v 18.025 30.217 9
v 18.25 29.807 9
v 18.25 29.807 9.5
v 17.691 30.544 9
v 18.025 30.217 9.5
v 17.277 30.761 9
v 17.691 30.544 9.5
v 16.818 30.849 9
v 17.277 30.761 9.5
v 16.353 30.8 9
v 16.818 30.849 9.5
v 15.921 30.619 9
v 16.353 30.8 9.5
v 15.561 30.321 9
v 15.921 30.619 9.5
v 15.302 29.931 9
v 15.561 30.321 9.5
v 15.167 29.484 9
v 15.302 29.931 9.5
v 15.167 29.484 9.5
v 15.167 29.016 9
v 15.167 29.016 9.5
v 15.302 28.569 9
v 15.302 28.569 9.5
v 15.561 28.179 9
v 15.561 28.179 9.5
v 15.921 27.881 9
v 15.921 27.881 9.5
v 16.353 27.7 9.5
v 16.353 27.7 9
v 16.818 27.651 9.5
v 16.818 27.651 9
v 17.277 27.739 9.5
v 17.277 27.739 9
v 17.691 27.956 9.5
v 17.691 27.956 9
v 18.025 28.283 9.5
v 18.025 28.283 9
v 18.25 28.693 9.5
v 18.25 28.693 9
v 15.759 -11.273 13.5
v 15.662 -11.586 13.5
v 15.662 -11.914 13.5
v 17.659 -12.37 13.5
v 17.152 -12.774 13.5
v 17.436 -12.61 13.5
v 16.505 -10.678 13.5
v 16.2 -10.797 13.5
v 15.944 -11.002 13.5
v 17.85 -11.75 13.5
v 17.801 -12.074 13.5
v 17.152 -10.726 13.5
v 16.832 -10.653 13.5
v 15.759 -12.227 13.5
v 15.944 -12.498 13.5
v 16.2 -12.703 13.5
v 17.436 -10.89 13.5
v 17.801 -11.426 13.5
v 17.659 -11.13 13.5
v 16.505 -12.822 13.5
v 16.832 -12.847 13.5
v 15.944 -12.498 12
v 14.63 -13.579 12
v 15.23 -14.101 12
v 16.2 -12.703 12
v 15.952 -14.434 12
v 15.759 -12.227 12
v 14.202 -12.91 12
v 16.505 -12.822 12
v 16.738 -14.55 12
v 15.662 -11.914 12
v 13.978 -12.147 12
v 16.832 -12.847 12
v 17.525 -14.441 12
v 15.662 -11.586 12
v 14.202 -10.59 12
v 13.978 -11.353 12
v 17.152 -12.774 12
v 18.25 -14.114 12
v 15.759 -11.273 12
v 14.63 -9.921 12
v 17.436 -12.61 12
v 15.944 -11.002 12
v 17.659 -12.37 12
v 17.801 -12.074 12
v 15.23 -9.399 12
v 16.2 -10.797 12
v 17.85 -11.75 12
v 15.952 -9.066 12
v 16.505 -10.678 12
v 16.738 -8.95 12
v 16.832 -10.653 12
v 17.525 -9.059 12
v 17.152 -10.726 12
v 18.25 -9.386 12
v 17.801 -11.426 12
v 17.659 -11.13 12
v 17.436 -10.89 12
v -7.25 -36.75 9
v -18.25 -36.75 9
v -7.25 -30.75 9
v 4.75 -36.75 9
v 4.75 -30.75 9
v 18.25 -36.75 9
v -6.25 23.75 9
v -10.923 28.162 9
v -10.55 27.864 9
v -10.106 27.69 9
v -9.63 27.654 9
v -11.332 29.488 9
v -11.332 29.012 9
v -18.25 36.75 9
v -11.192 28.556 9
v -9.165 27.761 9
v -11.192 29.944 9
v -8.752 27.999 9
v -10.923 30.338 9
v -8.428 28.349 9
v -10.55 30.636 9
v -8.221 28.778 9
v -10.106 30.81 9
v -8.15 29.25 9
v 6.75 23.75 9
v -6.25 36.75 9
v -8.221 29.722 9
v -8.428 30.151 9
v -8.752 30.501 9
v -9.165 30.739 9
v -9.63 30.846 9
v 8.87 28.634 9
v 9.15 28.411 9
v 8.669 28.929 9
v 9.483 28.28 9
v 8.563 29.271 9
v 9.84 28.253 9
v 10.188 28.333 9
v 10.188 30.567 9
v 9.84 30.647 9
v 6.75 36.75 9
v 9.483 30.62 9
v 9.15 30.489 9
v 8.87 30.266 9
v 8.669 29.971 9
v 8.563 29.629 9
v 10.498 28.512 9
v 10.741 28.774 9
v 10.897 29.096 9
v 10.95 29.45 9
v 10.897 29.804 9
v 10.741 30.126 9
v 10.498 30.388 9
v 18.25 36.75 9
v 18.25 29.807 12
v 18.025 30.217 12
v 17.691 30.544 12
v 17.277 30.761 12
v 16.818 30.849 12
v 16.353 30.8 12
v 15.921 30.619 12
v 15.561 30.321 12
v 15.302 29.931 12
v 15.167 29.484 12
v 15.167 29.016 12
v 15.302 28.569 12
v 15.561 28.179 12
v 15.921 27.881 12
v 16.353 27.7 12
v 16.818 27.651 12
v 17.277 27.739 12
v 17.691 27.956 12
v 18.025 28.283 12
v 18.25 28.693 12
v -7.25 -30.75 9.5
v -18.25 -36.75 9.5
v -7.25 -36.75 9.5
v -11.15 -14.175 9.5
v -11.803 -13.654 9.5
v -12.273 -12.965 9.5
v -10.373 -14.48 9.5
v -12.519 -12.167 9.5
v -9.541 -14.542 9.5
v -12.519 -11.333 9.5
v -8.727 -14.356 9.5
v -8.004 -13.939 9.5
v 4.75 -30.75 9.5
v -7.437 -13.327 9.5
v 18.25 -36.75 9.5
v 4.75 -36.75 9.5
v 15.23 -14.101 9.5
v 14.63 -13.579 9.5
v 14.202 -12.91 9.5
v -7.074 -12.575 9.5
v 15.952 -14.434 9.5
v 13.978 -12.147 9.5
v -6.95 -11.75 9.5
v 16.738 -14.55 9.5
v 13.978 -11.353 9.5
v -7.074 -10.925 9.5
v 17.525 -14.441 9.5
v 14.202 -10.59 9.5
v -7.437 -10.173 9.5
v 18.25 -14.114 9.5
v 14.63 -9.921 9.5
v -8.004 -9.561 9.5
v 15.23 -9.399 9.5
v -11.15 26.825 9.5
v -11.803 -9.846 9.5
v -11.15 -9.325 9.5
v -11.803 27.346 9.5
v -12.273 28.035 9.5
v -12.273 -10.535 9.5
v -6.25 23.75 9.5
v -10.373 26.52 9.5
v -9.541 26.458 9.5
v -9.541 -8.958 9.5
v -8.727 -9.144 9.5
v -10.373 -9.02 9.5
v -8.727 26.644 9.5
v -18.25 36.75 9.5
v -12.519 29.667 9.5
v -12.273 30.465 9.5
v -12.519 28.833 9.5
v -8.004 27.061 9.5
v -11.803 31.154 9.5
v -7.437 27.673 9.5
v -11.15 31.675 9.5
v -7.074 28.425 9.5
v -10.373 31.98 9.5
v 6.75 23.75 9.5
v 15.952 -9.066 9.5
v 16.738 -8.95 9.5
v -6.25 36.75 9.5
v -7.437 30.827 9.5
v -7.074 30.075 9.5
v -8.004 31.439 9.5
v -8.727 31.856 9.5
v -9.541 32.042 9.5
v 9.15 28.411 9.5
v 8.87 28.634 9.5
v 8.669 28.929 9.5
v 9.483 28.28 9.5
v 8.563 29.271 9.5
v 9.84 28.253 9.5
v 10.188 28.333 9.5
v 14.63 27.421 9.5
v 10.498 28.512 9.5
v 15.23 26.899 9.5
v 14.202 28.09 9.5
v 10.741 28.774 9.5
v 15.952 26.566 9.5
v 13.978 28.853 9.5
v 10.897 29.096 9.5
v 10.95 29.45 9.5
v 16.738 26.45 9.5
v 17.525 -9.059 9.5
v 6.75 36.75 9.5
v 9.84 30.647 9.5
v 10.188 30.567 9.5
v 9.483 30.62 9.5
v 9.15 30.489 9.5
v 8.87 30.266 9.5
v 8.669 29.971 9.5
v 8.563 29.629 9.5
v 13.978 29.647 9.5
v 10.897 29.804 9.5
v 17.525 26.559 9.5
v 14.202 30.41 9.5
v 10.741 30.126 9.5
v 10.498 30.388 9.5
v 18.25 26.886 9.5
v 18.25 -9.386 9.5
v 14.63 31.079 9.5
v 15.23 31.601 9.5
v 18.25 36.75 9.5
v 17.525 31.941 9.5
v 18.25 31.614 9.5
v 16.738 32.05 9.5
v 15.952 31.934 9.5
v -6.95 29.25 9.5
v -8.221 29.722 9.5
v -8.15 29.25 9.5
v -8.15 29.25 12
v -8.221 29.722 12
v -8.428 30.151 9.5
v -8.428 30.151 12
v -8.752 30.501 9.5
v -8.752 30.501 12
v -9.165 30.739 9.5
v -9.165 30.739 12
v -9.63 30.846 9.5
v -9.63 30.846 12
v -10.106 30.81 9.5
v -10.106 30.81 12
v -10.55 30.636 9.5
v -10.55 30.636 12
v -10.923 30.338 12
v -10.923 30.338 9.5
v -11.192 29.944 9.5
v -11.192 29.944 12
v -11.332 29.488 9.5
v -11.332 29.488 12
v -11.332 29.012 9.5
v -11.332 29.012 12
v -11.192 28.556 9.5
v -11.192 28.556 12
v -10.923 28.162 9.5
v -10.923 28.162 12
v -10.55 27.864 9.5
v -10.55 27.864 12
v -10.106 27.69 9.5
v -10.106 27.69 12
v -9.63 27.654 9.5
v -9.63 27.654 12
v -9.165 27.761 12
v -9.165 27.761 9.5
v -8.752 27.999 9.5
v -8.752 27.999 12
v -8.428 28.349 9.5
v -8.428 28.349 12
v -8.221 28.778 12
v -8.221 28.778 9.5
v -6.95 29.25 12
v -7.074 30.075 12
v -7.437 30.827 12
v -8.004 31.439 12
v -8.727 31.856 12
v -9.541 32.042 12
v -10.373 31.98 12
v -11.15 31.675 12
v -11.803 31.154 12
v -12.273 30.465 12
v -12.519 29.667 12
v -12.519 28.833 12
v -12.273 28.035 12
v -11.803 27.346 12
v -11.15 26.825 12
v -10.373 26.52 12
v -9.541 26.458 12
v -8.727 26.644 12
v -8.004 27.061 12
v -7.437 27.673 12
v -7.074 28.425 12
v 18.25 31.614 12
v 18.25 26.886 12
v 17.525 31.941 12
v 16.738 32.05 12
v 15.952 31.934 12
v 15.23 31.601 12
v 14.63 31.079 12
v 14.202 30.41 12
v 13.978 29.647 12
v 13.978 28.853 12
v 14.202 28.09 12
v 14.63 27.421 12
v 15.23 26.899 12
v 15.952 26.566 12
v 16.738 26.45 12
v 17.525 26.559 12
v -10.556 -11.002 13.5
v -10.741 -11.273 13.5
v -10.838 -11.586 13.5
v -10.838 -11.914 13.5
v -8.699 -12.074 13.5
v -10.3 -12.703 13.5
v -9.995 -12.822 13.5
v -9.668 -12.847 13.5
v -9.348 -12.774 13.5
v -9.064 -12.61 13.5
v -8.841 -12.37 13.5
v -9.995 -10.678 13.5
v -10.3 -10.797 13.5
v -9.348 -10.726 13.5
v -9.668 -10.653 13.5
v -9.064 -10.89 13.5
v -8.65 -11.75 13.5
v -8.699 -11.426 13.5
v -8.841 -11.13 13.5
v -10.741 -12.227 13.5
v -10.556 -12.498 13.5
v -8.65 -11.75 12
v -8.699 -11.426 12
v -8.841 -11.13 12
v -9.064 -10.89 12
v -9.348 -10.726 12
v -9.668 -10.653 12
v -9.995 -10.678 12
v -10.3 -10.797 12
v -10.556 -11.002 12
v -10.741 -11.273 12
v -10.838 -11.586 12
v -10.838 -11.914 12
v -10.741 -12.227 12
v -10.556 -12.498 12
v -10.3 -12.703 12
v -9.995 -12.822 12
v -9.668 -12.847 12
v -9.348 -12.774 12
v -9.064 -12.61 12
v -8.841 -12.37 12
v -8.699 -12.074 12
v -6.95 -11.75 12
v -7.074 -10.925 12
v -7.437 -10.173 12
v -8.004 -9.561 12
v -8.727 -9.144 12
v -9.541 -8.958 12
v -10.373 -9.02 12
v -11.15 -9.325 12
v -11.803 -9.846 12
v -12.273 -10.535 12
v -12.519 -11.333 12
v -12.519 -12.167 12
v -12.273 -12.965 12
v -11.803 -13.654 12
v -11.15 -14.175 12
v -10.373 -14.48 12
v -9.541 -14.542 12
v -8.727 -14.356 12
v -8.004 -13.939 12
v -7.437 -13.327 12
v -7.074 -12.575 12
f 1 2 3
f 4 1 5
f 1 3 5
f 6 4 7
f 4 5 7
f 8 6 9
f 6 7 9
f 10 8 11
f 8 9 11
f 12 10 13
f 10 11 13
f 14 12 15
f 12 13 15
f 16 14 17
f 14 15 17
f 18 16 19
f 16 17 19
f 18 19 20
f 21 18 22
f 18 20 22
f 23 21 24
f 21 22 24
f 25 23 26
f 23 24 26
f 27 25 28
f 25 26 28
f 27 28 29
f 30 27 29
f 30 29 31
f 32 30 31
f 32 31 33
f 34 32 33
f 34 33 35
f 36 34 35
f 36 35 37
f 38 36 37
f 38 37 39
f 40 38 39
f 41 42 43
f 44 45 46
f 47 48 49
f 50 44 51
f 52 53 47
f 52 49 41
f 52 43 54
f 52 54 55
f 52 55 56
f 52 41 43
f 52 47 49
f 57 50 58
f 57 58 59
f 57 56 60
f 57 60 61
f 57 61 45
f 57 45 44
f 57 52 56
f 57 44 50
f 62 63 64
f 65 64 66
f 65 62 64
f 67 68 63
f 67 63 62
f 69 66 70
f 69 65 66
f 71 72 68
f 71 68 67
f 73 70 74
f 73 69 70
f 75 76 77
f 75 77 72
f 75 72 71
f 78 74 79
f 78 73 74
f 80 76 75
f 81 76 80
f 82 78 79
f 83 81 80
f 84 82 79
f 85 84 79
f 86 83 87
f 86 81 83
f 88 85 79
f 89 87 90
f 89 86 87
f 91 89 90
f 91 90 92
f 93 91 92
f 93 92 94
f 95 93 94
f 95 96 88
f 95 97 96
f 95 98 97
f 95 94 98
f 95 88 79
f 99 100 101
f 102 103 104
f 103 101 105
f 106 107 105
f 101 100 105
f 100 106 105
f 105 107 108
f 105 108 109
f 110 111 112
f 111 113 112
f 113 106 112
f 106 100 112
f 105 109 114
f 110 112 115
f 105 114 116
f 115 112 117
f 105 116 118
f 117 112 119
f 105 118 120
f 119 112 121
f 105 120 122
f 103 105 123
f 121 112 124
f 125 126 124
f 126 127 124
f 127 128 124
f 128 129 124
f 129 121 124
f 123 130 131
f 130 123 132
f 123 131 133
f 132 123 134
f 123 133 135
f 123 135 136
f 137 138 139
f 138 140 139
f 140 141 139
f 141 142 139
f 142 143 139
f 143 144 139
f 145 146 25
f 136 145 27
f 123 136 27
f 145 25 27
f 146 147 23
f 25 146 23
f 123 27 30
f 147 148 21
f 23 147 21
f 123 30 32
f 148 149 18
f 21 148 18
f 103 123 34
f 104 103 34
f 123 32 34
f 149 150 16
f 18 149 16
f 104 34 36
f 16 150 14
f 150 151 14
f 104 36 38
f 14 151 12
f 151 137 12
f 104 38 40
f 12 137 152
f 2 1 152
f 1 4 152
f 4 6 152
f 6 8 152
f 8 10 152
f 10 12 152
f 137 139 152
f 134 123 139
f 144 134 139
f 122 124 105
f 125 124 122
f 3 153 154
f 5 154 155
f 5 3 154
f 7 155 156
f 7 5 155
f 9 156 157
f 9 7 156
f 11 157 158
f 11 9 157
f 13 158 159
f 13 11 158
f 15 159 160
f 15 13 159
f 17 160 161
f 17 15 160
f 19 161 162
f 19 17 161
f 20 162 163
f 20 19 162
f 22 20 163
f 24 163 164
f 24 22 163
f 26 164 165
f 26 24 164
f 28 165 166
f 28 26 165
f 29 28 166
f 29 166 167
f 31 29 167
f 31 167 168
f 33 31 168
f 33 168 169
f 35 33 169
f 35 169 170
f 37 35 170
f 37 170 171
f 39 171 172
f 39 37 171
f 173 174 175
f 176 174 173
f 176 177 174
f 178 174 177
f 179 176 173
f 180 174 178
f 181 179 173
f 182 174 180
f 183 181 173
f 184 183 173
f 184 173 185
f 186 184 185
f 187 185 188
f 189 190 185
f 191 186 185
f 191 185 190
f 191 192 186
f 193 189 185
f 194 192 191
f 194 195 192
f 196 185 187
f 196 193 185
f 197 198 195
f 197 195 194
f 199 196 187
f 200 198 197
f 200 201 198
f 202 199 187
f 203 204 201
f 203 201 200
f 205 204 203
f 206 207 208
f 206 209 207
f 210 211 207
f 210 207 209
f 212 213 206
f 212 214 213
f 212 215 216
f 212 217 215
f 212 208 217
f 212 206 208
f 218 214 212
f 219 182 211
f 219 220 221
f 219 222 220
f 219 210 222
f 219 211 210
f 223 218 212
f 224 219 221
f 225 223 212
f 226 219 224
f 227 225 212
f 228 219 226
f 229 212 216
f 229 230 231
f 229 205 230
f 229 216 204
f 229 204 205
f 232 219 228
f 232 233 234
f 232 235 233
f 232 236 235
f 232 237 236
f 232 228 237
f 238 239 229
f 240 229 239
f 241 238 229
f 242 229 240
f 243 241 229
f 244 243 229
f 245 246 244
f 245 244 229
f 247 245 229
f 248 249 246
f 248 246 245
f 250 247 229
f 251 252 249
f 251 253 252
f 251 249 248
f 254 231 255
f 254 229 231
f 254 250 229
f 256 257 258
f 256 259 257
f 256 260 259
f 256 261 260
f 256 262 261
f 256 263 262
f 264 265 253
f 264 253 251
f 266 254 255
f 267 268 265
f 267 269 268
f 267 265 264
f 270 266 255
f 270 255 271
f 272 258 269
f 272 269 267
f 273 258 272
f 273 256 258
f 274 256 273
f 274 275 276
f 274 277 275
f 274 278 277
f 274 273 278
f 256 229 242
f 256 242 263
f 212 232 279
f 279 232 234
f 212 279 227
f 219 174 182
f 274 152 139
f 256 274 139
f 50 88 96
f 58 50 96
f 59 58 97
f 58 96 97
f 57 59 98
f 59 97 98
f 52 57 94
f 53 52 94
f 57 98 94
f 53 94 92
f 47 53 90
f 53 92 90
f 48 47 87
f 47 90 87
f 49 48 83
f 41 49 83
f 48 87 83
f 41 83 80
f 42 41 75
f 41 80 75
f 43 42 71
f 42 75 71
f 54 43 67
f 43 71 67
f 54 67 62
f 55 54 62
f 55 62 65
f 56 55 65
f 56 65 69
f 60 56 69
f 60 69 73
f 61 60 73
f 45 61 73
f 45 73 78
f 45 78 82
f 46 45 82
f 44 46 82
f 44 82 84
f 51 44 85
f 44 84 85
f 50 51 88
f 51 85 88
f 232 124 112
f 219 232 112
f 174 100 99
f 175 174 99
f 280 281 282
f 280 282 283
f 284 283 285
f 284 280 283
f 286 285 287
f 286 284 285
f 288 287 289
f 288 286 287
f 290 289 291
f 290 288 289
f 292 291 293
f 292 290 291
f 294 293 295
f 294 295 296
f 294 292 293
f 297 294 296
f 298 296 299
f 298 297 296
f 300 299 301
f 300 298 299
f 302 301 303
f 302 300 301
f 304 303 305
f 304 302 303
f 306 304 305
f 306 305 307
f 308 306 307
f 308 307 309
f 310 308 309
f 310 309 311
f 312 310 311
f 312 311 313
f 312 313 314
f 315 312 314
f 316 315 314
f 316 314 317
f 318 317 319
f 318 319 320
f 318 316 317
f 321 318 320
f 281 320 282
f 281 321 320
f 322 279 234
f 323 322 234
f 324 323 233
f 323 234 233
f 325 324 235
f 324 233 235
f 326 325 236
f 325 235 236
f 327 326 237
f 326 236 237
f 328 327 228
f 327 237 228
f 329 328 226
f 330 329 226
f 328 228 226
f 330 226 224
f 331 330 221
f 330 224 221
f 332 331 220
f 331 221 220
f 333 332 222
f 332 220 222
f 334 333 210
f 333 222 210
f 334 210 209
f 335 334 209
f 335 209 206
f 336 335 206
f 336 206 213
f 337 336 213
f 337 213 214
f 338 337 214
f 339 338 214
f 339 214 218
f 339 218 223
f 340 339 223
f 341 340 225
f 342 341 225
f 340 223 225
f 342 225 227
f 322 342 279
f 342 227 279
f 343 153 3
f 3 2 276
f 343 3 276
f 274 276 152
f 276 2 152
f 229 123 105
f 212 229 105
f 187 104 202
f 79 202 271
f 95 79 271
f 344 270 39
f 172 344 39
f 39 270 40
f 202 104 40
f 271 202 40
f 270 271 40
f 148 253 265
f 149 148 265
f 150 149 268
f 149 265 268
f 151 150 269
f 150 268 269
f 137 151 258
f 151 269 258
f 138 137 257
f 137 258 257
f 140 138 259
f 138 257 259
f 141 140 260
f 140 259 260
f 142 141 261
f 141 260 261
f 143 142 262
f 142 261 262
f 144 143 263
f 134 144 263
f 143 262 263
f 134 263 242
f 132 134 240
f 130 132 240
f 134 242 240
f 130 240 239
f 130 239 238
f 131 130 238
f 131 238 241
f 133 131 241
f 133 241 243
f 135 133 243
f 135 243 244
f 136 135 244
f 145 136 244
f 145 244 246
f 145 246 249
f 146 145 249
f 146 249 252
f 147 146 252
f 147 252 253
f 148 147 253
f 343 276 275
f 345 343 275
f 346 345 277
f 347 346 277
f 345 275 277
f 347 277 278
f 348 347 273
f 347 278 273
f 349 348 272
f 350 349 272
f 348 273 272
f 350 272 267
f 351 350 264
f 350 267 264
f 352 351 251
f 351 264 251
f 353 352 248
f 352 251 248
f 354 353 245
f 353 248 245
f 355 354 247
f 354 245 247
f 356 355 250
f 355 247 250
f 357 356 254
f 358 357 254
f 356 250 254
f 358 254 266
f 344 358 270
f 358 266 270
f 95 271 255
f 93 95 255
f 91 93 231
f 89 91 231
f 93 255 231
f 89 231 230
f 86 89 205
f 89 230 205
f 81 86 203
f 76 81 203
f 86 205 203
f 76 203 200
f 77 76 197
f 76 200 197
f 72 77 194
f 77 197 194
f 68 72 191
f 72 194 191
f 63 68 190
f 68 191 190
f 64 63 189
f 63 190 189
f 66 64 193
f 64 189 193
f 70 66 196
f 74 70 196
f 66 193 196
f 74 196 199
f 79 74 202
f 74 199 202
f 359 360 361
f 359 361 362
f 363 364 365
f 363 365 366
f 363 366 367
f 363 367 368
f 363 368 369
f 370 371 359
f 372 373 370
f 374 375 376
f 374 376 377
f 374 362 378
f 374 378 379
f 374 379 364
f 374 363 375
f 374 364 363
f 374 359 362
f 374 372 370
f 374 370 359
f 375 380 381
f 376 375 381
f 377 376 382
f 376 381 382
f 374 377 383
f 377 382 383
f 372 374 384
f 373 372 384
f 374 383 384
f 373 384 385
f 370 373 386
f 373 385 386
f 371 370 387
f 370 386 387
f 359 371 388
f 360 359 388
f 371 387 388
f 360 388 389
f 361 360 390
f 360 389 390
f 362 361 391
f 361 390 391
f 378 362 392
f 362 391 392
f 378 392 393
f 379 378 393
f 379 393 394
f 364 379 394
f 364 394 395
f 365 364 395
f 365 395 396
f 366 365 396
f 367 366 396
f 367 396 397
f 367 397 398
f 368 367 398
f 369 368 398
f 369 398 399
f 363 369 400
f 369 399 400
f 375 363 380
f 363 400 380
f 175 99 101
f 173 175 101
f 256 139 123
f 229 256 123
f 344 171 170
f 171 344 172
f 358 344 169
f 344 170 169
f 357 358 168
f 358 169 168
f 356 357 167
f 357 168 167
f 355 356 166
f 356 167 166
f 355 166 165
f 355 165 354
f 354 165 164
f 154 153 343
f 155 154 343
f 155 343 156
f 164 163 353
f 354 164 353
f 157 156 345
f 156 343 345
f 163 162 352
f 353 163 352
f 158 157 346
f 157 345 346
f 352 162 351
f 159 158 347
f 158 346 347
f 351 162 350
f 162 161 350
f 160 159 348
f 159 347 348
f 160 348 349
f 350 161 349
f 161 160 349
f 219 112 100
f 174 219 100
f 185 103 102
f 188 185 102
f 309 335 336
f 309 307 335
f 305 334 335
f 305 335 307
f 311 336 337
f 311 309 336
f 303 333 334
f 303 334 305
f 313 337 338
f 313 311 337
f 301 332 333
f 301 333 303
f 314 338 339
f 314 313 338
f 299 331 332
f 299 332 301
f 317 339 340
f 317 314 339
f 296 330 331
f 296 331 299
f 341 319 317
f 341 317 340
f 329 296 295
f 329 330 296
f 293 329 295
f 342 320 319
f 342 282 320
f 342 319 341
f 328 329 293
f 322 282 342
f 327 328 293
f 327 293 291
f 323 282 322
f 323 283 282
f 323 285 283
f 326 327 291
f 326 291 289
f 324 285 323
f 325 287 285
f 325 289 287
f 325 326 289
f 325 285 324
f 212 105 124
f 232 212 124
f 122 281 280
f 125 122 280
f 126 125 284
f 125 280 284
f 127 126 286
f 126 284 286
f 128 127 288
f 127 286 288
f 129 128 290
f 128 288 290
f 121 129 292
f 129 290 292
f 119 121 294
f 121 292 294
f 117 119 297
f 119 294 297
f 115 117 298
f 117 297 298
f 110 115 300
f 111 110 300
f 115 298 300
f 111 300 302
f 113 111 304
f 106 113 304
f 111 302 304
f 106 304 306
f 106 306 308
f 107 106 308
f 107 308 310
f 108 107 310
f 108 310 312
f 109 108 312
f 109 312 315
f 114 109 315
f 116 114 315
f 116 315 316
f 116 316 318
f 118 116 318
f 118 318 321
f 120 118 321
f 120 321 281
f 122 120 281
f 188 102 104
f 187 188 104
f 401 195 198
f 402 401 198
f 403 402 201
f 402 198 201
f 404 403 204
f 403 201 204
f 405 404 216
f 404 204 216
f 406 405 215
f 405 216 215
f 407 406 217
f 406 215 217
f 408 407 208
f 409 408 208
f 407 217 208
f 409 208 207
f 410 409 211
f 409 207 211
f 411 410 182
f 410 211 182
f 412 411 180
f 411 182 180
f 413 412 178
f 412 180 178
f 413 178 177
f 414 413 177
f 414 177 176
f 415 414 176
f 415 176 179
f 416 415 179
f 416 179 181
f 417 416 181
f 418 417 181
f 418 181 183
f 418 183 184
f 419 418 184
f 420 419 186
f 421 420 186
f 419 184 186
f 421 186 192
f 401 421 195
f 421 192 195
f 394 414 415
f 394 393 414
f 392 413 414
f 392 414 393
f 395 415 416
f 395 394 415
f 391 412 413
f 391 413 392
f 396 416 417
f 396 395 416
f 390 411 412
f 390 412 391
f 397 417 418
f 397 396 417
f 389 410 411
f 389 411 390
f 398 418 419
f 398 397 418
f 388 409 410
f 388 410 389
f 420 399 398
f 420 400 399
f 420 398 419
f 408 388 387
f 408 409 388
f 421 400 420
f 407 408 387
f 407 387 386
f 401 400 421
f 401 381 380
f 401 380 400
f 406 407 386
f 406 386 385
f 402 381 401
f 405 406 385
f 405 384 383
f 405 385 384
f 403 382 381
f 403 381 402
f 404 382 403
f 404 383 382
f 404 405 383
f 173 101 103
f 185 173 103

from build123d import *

# Parameters (mm, degrees)
PAD011_DEPTH       = 0.5
SKETCH009_R        = 1.6
SKETCH009_R_2      = 1.2
POCKET012014_DEPTH = 0.501
SKETCH010_R        = 2.8
SKETCH010_R_2      = 1.6
PAD012_DEPTH       = 2.5
SKETCH011_R        = 1.1
PAD013_DEPTH       = 1.5


with BuildPart() as part:
    # Sketch008 → Pad011 (new body)
    with BuildSketch(Plane.XY.offset(9)):
        Polygon((18.25, -36.75), (18.25, 36.75), (6.75, 36.75), (6.75, 23.75), (-6.25, 23.75), (-6.25, 36.75), (-18.25, 36.75), (-18.25, -36.75), (-7.25, -36.75), (-7.25, -30.75), (4.75, -30.75), (4.75, -36.75), align=None)
    extrude(amount=PAD011_DEPTH)

    # Sketch009 → Pocket012014 (cut, through all)
    with BuildSketch(Plane.XY.offset(9.5)):
        with Locations((-9.75, 29.25)):
            Circle(SKETCH009_R)
        with Locations((16.75, 29.25)):
            Circle(SKETCH009_R)
        with Locations((9.75, 29.45)):
            Circle(SKETCH009_R_2)
    extrude(amount=-POCKET012014_DEPTH, mode=Mode.SUBTRACT)

    # Sketch010 → Pad012 (new body)
    with BuildSketch(Plane.XY.offset(9.5)):
        with Locations((-9.75, 29.25)):
            Circle(SKETCH010_R)
        with Locations((-9.75, 29.25)):
            Circle(SKETCH010_R_2, mode=Mode.SUBTRACT)
        with Locations((-9.75, -11.75)):
            Circle(SKETCH010_R)
        with BuildLine():
            ThreePointArc((18.25, 29.806776), (15.15, 29.25), (18.25, 28.693224))
            Line((18.25, 28.693224), (18.25, 26.885682))
            ThreePointArc((18.25, 31.614318), (13.95, 29.25), (18.25, 26.885682))
            Line((18.25, 31.614318), (18.25, 29.806776))
        make_face()
        with BuildLine():
            ThreePointArc((18.25, -9.385682), (13.95, -11.75), (18.25, -14.114318))
            Line((18.25, -9.385682), (18.25, -14.114318))
        make_face()
    extrude(amount=PAD012_DEPTH)

    # Sketch011 → Pad013 (new body)
    with BuildSketch(Plane.XY.offset(12)):
        with Locations((-9.75, -11.75)):
            Circle(SKETCH011_R)
        with Locations((16.75, -11.75)):
            Circle(SKETCH011_R)
    extrude(amount=PAD013_DEPTH)


solid = part.part
